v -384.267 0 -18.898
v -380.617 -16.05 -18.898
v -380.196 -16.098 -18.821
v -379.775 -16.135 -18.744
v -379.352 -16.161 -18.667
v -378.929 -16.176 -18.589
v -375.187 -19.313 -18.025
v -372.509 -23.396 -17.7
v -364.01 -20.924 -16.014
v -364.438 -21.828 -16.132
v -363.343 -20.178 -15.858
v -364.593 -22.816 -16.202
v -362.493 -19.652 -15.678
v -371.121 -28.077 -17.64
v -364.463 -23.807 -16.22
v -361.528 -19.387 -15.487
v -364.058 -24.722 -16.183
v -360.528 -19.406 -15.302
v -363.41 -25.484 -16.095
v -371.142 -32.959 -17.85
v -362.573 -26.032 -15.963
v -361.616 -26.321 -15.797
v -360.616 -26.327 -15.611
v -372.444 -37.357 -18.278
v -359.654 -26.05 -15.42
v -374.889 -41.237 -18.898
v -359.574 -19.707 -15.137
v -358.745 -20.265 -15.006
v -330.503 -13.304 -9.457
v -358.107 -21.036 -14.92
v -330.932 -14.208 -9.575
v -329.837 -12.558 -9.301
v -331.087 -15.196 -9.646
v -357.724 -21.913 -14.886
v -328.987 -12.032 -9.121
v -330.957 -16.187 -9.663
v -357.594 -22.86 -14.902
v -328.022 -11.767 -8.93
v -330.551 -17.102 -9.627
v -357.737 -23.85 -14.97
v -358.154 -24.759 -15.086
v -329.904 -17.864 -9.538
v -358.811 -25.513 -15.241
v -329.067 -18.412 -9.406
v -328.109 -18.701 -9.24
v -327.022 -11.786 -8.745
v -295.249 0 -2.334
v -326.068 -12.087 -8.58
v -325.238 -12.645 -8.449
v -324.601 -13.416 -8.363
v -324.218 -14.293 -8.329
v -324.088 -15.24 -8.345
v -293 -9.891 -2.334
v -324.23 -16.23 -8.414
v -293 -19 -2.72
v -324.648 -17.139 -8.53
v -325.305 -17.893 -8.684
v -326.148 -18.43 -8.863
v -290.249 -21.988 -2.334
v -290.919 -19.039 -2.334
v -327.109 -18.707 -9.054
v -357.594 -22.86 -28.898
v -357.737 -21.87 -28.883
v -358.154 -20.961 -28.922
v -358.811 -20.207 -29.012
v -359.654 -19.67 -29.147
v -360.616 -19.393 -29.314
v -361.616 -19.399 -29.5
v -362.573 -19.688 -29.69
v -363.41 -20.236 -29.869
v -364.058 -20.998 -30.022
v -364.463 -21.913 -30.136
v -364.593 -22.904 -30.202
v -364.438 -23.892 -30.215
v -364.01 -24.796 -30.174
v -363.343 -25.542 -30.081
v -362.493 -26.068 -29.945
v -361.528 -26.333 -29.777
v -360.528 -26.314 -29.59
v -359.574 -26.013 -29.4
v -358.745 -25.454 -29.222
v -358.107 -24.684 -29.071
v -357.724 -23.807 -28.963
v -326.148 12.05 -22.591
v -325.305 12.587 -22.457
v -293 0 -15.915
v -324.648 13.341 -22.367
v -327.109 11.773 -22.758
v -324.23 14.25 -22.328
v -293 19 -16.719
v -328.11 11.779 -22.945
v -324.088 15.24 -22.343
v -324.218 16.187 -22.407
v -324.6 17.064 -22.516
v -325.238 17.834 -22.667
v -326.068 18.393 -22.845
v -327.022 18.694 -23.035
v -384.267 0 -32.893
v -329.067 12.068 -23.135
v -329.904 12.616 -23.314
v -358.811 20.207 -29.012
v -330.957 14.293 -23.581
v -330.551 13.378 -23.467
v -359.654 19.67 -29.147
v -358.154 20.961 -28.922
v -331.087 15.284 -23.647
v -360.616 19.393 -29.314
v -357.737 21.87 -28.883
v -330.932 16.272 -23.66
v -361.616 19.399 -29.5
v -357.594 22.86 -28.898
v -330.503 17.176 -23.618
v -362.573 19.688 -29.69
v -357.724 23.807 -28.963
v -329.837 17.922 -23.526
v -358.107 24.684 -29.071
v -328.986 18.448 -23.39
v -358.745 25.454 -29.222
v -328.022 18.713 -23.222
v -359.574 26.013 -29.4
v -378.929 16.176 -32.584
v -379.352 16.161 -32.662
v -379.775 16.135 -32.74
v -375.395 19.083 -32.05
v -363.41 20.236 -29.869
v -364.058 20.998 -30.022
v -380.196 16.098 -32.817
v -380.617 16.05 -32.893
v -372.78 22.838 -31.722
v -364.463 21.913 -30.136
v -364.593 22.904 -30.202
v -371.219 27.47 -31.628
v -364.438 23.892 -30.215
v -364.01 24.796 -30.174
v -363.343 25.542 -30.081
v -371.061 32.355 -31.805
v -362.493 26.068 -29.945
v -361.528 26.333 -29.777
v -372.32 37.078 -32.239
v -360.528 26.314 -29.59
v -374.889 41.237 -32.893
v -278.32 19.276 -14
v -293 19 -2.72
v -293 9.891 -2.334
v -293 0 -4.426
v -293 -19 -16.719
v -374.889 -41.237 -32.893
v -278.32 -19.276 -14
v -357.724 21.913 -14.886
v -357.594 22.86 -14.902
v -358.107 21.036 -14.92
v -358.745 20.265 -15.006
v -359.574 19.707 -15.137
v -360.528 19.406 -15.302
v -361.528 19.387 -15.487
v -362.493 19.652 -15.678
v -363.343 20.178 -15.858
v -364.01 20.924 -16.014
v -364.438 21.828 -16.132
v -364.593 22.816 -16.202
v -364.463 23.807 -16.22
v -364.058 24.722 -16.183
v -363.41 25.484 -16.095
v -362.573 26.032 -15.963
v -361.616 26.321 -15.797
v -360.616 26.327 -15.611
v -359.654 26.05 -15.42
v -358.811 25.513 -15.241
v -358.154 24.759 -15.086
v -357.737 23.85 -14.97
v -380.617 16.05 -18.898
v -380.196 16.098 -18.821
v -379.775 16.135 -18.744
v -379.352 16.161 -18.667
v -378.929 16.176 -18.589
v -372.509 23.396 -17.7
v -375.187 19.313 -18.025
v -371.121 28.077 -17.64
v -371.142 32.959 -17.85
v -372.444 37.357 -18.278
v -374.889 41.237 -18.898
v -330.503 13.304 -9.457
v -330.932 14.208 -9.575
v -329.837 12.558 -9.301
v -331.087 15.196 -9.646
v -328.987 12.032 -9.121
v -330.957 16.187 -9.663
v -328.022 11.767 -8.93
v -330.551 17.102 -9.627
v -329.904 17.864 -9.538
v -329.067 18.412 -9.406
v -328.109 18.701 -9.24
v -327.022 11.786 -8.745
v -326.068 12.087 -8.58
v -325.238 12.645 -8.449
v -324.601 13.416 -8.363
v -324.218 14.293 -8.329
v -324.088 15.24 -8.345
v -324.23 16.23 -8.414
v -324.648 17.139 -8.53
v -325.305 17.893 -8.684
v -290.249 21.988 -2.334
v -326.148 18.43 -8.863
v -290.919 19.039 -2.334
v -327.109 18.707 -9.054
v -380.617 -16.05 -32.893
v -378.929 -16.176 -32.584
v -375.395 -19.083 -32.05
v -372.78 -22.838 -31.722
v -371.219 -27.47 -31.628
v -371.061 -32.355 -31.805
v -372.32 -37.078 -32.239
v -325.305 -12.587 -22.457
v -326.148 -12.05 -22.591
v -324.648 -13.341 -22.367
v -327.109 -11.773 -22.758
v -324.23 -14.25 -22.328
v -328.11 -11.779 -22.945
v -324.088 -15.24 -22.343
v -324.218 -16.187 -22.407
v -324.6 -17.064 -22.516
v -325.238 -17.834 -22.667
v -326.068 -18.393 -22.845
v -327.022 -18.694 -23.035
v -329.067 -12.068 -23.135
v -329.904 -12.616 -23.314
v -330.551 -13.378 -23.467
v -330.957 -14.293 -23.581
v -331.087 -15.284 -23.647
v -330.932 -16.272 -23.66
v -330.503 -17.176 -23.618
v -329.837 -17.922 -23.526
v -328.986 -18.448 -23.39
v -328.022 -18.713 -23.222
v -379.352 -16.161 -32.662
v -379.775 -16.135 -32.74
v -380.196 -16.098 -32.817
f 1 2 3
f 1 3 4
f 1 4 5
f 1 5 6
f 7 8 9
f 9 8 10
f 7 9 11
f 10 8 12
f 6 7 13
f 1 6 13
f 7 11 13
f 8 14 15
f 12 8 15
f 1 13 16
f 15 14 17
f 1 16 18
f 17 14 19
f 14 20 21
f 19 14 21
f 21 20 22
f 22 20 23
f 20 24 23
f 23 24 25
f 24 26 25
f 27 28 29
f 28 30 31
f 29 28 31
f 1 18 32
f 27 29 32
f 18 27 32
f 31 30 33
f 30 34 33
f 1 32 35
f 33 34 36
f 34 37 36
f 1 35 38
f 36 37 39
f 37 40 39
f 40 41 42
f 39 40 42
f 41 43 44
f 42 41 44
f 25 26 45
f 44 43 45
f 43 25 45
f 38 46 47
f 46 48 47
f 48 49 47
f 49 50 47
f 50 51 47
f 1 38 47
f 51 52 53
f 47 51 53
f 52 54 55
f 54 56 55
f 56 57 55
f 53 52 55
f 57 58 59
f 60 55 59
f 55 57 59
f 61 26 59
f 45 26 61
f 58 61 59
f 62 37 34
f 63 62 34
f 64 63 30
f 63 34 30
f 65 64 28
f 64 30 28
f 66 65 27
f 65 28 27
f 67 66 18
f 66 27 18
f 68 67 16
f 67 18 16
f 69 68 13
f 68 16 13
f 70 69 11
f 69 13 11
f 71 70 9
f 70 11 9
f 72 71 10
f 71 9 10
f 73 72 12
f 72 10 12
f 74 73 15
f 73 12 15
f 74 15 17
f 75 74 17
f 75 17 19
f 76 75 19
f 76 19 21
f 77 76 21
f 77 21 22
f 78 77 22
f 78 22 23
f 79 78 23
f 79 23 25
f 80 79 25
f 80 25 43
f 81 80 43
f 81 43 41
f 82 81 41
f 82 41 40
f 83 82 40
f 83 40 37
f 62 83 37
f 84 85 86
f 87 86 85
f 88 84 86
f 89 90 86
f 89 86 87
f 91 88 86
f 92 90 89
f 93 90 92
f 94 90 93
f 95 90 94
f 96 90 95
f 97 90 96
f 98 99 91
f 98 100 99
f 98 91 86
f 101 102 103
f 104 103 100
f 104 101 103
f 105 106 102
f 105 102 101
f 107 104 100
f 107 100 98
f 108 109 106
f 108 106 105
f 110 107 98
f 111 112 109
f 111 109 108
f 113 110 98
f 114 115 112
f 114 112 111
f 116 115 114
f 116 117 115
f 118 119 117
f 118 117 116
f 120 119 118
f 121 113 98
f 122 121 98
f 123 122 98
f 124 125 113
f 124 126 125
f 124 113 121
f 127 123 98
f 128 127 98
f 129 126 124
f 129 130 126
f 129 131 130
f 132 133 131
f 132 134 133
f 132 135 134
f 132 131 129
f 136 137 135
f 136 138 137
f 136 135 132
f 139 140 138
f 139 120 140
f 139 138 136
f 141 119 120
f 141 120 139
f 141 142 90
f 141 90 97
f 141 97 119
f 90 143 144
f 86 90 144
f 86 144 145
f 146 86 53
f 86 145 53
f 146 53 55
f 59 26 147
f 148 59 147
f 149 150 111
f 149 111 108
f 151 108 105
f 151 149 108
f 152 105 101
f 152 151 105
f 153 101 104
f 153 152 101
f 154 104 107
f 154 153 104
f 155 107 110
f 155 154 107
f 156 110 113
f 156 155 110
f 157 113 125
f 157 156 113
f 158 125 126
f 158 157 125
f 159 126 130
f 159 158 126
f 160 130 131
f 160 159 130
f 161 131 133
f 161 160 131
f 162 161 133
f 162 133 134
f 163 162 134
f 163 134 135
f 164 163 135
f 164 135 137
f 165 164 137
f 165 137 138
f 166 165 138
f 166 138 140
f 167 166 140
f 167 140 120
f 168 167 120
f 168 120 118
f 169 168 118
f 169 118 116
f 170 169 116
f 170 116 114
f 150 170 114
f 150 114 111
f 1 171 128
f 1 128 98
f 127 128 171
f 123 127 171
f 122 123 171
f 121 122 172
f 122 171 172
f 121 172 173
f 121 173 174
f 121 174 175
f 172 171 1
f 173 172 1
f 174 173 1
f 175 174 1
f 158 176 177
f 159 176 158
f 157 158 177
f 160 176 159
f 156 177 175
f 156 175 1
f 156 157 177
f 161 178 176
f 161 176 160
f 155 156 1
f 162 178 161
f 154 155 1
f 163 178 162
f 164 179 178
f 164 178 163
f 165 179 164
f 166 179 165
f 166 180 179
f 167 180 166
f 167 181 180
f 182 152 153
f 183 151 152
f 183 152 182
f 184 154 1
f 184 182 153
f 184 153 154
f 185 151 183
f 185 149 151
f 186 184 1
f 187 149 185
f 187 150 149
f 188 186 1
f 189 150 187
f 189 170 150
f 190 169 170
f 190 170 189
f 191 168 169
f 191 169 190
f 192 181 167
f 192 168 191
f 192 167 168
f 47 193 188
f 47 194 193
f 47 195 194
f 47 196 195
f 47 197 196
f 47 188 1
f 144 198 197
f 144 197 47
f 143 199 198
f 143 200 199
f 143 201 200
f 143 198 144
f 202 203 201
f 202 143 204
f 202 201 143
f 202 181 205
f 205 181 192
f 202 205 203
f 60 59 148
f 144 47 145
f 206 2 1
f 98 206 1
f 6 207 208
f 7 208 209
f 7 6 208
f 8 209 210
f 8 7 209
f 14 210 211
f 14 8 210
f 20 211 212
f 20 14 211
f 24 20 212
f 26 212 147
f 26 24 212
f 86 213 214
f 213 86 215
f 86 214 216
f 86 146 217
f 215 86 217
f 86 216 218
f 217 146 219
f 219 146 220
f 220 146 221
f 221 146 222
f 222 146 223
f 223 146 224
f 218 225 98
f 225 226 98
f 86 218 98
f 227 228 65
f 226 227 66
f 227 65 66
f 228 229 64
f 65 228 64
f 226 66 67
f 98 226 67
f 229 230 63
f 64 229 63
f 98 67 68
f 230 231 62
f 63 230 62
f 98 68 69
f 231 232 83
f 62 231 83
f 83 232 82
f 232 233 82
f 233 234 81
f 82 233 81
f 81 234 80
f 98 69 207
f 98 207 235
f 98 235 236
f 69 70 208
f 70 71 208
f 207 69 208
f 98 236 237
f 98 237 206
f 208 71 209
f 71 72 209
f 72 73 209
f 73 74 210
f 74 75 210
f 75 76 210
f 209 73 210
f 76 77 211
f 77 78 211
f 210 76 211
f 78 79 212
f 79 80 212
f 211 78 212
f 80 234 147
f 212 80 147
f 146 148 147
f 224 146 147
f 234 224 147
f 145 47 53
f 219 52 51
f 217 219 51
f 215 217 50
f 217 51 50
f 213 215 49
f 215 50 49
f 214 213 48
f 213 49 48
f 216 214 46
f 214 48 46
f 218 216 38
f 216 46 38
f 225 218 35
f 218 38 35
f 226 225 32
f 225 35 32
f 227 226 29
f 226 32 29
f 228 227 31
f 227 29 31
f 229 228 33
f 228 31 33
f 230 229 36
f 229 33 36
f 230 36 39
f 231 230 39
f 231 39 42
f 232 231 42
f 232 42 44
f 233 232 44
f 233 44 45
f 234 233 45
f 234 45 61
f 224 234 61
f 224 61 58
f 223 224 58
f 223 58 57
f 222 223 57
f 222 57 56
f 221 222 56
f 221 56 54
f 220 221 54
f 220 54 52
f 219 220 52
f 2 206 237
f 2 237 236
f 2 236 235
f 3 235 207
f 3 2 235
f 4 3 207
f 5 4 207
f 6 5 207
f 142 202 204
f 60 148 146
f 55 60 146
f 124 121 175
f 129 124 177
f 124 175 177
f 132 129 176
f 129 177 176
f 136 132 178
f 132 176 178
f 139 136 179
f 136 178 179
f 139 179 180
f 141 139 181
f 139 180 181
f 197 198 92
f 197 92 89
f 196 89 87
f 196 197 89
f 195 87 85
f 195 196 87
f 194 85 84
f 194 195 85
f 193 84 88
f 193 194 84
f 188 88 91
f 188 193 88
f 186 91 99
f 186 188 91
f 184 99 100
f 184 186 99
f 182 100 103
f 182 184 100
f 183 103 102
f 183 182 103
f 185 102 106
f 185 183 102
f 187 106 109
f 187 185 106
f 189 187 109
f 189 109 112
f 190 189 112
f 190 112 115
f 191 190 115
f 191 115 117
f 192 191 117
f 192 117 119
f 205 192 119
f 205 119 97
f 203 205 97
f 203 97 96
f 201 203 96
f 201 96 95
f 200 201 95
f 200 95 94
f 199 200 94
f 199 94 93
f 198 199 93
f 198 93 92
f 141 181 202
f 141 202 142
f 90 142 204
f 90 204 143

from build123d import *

# Parameters (mm, degrees)
F0_R     = 3.5
F1_DEPTH = 32.893
F3_DEPTH = 44.5826506487
F5_DEPTH = 32.894


# Not quite as in the source:
# - a feature names something its author has since deleted; it is built from what else it names


with BuildPart() as f1:
    # F0 (on Top) → F1 (new body)
    with BuildSketch(Plane.XY):
        with BuildLine():
            Line((-293, -19), (-293, 0))
            Line((-293, 0), (-394.6, 0))
            Line((-394.6, 0), (-394.6, -0.3249169361))
            ThreePointArc((-394.6, -0.3249169361), (-389.9738981677, -11.4236067086), (-378.9287209511, -16.1760579795))
            ThreePointArc((-378.9287209511, -16.1760579795), (-371.1660381492, -27.7809948386), (-374.8890577817, -41.2373289829))
            Line((-374.8890577817, -41.2373289829), (-278.3200451143, -19.2755622931))
            Line((-278.3200451143, -19.2755622931), (-293, -19))
        make_face()
        with Locations((-361.0937758916, -22.86)):
            Circle(F0_R, mode=Mode.SUBTRACT)
        with Locations((-327.5875517832, -15.24)):
            Circle(F0_R, mode=Mode.SUBTRACT)
    extrude(amount=-F1_DEPTH)

    # F2 (on face) → F3 (cut, through all)
    with BuildSketch(Plane(origin=(-9.5187600933, 41.855342378, 0), x_dir=(0.9751017202, 0.2217580556, 0), z_dir=(0.2217580556, -0.9751017202, 0))):
        Polygon((-275.6648659783, -32.893), (-275.6648659783, -14), (-374.6996750289, -32.893), align=None)
        Polygon((-374.6996750289, -18.8976), (-287.8981553787, -2.3343288283), (-275.6648659783, -14), (-275.6648659783, 0), (-374.6996750289, 0), align=None)
    extrude(amount=-F3_DEPTH, mode=Mode.SUBTRACT)

    # F4: F1 across plane


with BuildPart() as f1_1:
    add(f1.part)
    add(f1.part.mirror(Plane.XZ))

    # F5 (cut, through all): a face of the model
    f5_faces = [f1_1.faces().sort_by_distance(p)[0] for p in [
        (-387.4719249036, 0, 0),
    ]]
    extrude(f5_faces, amount=-F5_DEPTH, mode=Mode.SUBTRACT)


solid = f1_1.part
